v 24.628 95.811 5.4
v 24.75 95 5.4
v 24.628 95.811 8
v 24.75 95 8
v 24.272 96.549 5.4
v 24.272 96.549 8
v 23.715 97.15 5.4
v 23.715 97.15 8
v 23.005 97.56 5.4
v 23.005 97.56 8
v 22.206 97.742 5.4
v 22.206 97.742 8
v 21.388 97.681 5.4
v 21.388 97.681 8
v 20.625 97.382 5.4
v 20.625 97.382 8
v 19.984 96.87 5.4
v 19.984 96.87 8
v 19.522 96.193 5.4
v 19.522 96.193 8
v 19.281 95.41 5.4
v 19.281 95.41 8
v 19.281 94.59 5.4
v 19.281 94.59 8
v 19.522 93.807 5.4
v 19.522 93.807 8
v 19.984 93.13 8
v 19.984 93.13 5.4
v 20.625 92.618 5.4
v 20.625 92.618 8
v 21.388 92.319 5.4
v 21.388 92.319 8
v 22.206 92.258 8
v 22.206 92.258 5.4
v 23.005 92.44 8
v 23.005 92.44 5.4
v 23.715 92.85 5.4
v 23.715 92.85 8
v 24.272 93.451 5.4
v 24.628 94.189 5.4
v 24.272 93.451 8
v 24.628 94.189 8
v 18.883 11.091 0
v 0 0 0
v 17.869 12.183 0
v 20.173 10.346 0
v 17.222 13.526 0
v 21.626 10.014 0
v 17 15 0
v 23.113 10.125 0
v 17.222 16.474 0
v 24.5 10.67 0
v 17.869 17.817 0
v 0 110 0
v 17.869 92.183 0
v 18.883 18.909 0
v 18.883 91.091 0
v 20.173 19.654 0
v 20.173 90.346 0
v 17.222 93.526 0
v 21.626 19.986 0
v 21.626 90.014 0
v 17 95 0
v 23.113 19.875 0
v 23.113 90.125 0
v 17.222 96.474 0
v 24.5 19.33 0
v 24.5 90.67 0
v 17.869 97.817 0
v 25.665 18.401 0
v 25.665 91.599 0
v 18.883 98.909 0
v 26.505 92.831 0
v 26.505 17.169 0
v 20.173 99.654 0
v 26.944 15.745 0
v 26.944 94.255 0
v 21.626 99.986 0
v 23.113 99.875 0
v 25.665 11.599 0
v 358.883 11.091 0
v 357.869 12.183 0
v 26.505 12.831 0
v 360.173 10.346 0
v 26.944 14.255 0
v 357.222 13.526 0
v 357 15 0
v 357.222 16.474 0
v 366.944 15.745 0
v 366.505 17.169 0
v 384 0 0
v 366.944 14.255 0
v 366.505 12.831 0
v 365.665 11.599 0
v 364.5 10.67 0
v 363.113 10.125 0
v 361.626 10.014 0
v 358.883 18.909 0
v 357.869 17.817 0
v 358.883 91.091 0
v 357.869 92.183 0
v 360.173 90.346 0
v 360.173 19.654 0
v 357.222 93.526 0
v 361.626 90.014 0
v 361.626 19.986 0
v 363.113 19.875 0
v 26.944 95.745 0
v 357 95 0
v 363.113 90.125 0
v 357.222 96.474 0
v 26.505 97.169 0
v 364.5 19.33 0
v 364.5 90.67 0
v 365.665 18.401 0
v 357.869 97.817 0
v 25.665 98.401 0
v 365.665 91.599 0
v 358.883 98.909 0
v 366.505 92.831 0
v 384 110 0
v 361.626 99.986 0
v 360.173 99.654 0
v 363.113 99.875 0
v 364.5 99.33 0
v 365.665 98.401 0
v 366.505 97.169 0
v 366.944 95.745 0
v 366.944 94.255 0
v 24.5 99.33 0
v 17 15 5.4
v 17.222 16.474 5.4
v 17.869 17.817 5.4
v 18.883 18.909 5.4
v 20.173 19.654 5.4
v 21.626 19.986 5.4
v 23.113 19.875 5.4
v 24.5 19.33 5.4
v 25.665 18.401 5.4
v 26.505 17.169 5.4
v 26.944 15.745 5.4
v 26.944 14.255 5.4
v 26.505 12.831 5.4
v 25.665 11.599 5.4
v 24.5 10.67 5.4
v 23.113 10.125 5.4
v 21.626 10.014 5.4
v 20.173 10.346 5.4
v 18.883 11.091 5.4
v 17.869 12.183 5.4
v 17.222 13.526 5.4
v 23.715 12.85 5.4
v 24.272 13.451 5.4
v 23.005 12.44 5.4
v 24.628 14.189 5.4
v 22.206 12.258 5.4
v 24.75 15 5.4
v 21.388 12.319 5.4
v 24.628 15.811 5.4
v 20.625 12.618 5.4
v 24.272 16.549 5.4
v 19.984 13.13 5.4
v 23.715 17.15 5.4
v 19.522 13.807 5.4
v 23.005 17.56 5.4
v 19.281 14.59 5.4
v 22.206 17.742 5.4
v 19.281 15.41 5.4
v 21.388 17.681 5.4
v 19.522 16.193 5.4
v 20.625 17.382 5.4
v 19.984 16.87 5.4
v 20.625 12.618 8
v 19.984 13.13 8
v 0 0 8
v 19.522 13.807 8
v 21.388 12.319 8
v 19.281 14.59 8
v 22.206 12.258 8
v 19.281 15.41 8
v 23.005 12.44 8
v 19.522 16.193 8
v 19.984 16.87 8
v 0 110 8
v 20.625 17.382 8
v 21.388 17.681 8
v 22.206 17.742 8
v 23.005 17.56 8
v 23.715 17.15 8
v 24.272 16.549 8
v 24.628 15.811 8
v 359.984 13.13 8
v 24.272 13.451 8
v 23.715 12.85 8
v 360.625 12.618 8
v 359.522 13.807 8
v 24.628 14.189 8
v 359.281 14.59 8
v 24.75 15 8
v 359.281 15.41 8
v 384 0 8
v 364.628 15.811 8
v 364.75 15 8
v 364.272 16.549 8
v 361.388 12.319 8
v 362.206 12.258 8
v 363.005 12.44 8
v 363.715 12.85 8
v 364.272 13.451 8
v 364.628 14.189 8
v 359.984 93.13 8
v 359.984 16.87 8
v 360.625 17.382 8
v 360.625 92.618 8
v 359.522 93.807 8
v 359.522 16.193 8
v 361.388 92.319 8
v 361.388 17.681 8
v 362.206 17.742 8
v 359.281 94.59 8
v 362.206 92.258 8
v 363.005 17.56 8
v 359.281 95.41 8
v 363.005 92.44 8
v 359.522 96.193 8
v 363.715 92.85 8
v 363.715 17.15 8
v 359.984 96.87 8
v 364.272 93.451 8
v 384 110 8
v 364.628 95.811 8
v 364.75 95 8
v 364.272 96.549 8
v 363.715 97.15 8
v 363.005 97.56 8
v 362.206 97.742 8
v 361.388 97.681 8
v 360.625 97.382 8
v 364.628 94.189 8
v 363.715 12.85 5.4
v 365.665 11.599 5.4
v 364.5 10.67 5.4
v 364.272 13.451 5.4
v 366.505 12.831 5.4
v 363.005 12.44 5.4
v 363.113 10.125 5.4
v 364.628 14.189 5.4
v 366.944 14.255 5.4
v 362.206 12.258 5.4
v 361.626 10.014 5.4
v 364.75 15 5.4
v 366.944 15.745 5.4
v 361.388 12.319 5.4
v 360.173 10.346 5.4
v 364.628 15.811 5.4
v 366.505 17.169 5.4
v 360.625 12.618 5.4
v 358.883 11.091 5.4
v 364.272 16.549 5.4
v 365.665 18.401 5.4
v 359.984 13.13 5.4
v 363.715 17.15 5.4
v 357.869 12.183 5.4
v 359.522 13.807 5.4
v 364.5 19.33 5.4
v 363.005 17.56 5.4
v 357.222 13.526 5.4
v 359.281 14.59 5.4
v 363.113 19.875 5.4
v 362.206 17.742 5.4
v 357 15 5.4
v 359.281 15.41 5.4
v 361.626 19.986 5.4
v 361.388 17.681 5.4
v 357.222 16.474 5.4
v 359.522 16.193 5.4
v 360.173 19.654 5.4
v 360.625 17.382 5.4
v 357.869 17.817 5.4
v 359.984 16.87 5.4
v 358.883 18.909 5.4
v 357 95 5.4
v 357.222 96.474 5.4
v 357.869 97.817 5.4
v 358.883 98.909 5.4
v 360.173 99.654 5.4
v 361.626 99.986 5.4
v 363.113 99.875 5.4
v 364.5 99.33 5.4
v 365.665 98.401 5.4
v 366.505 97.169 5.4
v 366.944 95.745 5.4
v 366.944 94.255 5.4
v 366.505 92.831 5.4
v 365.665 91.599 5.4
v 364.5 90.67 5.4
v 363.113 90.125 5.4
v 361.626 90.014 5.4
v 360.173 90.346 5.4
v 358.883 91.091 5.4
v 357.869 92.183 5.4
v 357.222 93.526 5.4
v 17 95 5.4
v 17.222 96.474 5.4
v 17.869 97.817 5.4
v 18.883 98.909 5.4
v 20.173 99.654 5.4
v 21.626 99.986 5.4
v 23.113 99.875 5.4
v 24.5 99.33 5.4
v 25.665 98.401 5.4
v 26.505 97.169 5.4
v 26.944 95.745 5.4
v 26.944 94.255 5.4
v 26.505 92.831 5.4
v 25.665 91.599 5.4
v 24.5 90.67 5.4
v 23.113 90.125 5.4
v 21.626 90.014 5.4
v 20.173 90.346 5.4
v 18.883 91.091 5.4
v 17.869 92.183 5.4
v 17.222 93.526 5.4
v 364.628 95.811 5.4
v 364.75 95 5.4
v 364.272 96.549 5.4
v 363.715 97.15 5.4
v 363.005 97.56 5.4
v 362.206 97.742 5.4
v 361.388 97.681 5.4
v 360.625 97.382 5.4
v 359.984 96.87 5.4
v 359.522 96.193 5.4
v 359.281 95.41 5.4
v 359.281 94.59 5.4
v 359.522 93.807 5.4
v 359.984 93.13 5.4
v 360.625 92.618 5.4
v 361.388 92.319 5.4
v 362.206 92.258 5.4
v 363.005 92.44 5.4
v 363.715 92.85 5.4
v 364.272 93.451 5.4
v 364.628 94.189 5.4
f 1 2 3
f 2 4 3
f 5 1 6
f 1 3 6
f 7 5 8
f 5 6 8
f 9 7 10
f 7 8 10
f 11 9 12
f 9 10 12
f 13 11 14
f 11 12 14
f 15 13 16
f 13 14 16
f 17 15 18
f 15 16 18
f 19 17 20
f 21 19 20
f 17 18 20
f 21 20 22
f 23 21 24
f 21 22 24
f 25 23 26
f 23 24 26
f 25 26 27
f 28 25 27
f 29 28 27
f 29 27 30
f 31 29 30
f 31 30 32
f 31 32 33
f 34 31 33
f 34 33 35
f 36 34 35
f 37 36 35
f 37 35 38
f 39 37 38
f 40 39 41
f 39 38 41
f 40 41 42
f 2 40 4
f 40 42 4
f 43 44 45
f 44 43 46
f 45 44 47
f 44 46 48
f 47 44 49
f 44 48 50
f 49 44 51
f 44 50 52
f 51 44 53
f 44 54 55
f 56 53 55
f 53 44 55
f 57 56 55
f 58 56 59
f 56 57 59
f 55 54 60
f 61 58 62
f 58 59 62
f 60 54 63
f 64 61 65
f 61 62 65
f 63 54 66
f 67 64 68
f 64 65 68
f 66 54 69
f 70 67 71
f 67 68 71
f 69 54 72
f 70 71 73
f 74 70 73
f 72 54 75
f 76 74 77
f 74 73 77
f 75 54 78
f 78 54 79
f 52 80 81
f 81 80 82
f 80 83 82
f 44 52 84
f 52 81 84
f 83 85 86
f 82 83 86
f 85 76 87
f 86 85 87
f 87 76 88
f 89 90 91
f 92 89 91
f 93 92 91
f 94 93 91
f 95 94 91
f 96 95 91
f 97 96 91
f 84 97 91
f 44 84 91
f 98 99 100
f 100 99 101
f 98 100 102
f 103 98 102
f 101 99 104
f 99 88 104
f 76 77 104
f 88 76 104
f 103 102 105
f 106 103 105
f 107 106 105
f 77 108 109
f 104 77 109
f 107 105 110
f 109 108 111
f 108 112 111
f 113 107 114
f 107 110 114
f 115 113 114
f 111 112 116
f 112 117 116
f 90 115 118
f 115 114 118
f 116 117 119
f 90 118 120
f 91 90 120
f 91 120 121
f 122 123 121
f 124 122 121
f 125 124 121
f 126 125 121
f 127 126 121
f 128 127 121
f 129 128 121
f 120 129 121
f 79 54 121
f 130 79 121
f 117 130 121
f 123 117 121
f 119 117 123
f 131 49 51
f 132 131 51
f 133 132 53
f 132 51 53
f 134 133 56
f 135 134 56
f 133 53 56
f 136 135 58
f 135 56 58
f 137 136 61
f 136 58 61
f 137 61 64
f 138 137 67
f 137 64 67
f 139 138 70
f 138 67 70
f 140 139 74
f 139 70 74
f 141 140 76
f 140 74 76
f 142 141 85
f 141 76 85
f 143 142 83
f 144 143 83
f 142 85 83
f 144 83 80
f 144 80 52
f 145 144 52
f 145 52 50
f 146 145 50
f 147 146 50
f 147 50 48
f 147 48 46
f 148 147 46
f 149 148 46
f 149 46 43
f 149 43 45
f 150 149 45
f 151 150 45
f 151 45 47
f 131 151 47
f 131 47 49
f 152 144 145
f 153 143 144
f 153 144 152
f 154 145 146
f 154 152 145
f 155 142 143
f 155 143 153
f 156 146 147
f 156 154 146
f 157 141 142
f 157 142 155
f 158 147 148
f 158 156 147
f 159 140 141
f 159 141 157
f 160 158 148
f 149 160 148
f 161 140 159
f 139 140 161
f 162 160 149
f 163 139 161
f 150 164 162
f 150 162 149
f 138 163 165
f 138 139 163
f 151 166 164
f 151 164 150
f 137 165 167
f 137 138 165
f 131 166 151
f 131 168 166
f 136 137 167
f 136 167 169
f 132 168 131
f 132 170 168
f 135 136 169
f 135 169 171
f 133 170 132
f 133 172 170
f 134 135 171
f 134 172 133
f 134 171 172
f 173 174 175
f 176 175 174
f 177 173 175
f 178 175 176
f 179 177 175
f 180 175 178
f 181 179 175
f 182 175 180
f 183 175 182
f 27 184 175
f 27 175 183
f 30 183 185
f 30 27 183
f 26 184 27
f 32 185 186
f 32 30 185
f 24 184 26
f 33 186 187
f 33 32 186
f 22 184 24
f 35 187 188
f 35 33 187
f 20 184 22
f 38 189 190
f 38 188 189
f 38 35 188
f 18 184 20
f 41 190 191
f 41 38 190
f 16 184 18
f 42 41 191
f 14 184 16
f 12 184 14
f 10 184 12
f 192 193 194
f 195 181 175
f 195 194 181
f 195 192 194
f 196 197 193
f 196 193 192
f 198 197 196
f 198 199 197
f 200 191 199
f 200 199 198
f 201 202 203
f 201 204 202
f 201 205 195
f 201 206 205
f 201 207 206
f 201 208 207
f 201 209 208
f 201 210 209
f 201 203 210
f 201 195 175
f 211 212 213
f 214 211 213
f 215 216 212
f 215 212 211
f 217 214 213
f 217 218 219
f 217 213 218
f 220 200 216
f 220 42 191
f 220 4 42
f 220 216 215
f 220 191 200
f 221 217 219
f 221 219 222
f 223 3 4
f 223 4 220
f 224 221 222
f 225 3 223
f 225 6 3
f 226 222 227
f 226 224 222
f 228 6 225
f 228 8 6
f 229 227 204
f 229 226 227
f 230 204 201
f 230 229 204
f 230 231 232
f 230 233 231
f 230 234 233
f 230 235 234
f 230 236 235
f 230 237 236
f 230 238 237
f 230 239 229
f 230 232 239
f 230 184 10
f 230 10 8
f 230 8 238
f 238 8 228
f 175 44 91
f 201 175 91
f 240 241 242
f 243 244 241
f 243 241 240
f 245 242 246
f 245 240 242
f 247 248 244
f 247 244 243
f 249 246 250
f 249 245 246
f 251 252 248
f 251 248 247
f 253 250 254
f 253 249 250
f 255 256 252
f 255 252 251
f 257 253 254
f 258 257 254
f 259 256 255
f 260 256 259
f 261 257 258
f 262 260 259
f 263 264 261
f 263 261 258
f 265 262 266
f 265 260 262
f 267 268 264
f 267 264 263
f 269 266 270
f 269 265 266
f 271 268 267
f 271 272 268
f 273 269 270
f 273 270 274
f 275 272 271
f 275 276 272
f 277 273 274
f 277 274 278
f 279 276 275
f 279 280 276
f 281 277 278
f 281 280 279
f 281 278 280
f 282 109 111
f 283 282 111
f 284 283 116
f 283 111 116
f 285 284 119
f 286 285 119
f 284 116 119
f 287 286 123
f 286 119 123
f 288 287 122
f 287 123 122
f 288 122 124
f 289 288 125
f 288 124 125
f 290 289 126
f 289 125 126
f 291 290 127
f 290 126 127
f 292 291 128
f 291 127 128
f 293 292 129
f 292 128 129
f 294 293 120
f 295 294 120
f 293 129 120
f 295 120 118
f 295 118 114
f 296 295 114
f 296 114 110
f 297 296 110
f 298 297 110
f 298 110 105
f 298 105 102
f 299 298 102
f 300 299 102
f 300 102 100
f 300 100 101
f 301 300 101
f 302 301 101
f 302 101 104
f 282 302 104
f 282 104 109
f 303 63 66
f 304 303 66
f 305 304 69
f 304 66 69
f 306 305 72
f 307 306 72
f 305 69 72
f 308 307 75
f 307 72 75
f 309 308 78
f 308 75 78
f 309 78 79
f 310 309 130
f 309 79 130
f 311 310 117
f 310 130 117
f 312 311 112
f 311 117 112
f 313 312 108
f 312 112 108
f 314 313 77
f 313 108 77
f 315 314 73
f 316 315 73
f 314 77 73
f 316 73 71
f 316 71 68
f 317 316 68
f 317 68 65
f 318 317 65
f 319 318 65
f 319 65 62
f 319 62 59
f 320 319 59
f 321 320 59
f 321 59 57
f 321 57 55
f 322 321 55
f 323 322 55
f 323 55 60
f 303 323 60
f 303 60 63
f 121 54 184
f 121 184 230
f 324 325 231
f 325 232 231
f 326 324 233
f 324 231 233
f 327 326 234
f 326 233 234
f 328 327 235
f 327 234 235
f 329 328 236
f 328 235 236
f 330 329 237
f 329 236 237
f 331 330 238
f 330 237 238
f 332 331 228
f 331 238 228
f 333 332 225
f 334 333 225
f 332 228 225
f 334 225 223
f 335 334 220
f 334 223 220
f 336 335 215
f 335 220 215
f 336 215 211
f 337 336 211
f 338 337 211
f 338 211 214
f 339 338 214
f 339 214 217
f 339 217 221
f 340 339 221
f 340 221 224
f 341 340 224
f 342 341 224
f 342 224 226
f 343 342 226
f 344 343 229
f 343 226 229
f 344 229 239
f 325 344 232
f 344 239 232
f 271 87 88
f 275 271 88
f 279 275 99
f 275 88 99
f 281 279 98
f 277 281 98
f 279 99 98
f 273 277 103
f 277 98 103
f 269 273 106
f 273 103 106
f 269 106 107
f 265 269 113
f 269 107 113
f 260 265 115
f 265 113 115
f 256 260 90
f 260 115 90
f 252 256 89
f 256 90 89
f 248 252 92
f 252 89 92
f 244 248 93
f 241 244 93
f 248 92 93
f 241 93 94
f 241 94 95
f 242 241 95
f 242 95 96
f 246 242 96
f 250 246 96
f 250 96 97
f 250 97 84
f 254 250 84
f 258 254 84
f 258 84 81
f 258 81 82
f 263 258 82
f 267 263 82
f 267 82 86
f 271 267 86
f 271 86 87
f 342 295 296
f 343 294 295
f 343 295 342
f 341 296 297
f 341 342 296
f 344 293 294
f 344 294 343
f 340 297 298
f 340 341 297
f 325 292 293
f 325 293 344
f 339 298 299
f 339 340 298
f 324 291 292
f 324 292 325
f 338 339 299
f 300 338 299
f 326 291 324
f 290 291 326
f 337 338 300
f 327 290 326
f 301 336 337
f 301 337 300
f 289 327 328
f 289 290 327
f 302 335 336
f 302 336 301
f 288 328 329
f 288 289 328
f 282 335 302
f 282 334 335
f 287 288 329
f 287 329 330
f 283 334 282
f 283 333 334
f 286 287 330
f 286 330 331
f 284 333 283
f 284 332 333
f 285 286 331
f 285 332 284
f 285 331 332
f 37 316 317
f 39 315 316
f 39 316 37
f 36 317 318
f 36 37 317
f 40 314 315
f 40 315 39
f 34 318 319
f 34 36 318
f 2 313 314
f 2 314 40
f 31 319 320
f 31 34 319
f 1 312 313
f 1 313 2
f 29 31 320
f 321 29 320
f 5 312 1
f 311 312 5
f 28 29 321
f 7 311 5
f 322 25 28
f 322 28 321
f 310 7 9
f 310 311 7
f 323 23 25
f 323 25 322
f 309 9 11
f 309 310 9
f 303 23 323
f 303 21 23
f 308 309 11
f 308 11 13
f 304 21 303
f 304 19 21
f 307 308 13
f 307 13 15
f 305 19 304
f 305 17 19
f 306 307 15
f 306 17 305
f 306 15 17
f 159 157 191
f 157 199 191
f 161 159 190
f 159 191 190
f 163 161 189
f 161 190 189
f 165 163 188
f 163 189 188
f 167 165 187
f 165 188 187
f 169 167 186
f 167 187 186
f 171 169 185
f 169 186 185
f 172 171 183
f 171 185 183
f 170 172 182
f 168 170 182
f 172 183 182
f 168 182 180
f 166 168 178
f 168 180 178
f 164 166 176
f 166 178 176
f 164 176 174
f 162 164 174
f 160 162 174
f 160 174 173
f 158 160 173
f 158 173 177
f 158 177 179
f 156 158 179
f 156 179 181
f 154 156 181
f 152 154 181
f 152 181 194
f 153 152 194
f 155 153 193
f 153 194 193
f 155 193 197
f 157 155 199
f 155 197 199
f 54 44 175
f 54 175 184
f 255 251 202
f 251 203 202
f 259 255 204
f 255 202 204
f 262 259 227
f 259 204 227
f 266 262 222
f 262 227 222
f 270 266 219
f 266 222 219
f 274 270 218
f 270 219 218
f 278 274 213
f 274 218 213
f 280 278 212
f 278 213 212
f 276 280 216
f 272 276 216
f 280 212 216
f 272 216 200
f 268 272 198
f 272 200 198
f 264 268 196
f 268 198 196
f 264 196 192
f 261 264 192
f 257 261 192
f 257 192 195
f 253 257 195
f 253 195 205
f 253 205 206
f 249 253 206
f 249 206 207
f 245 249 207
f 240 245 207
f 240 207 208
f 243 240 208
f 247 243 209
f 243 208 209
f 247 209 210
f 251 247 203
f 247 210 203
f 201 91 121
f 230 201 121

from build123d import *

# Parameters (mm, degrees)
SKETCH1_W                                           = 384
SKETCH1_H                                           = 110
EXTRUDE2_DEPTH                                      = 8
CBORE_FOR_M5_HEX_SOCKET_HEAD_CAP_SCREW1_D           = 5.5
CBORE_FOR_M5_HEX_SOCKET_HEAD_CAP_SCREW1_CBORE_D     = 10
CBORE_FOR_M5_HEX_SOCKET_HEAD_CAP_SCREW1_CBORE_DEPTH = 5.4


with BuildPart() as part:
    # Sketch1 → Extrude2 (new body)
    with BuildSketch(Plane.XY):
        with Locations((192, 55)):
            Rectangle(SKETCH1_W, SKETCH1_H)
    extrude(amount=EXTRUDE2_DEPTH)

    # CBORE for M5 Hex Socket Head Cap Screw1 (through all)
    with Locations(Plane(origin=(362, 95, 0), x_dir=(-1, 0, 0), z_dir=(0, 0, -1))):
        with Locations((0, 0), (340, 0), (340, -80), (0, -80)):
            CounterBoreHole(CBORE_FOR_M5_HEX_SOCKET_HEAD_CAP_SCREW1_D / 2, CBORE_FOR_M5_HEX_SOCKET_HEAD_CAP_SCREW1_CBORE_D / 2, CBORE_FOR_M5_HEX_SOCKET_HEAD_CAP_SCREW1_CBORE_DEPTH)


solid = part.part
